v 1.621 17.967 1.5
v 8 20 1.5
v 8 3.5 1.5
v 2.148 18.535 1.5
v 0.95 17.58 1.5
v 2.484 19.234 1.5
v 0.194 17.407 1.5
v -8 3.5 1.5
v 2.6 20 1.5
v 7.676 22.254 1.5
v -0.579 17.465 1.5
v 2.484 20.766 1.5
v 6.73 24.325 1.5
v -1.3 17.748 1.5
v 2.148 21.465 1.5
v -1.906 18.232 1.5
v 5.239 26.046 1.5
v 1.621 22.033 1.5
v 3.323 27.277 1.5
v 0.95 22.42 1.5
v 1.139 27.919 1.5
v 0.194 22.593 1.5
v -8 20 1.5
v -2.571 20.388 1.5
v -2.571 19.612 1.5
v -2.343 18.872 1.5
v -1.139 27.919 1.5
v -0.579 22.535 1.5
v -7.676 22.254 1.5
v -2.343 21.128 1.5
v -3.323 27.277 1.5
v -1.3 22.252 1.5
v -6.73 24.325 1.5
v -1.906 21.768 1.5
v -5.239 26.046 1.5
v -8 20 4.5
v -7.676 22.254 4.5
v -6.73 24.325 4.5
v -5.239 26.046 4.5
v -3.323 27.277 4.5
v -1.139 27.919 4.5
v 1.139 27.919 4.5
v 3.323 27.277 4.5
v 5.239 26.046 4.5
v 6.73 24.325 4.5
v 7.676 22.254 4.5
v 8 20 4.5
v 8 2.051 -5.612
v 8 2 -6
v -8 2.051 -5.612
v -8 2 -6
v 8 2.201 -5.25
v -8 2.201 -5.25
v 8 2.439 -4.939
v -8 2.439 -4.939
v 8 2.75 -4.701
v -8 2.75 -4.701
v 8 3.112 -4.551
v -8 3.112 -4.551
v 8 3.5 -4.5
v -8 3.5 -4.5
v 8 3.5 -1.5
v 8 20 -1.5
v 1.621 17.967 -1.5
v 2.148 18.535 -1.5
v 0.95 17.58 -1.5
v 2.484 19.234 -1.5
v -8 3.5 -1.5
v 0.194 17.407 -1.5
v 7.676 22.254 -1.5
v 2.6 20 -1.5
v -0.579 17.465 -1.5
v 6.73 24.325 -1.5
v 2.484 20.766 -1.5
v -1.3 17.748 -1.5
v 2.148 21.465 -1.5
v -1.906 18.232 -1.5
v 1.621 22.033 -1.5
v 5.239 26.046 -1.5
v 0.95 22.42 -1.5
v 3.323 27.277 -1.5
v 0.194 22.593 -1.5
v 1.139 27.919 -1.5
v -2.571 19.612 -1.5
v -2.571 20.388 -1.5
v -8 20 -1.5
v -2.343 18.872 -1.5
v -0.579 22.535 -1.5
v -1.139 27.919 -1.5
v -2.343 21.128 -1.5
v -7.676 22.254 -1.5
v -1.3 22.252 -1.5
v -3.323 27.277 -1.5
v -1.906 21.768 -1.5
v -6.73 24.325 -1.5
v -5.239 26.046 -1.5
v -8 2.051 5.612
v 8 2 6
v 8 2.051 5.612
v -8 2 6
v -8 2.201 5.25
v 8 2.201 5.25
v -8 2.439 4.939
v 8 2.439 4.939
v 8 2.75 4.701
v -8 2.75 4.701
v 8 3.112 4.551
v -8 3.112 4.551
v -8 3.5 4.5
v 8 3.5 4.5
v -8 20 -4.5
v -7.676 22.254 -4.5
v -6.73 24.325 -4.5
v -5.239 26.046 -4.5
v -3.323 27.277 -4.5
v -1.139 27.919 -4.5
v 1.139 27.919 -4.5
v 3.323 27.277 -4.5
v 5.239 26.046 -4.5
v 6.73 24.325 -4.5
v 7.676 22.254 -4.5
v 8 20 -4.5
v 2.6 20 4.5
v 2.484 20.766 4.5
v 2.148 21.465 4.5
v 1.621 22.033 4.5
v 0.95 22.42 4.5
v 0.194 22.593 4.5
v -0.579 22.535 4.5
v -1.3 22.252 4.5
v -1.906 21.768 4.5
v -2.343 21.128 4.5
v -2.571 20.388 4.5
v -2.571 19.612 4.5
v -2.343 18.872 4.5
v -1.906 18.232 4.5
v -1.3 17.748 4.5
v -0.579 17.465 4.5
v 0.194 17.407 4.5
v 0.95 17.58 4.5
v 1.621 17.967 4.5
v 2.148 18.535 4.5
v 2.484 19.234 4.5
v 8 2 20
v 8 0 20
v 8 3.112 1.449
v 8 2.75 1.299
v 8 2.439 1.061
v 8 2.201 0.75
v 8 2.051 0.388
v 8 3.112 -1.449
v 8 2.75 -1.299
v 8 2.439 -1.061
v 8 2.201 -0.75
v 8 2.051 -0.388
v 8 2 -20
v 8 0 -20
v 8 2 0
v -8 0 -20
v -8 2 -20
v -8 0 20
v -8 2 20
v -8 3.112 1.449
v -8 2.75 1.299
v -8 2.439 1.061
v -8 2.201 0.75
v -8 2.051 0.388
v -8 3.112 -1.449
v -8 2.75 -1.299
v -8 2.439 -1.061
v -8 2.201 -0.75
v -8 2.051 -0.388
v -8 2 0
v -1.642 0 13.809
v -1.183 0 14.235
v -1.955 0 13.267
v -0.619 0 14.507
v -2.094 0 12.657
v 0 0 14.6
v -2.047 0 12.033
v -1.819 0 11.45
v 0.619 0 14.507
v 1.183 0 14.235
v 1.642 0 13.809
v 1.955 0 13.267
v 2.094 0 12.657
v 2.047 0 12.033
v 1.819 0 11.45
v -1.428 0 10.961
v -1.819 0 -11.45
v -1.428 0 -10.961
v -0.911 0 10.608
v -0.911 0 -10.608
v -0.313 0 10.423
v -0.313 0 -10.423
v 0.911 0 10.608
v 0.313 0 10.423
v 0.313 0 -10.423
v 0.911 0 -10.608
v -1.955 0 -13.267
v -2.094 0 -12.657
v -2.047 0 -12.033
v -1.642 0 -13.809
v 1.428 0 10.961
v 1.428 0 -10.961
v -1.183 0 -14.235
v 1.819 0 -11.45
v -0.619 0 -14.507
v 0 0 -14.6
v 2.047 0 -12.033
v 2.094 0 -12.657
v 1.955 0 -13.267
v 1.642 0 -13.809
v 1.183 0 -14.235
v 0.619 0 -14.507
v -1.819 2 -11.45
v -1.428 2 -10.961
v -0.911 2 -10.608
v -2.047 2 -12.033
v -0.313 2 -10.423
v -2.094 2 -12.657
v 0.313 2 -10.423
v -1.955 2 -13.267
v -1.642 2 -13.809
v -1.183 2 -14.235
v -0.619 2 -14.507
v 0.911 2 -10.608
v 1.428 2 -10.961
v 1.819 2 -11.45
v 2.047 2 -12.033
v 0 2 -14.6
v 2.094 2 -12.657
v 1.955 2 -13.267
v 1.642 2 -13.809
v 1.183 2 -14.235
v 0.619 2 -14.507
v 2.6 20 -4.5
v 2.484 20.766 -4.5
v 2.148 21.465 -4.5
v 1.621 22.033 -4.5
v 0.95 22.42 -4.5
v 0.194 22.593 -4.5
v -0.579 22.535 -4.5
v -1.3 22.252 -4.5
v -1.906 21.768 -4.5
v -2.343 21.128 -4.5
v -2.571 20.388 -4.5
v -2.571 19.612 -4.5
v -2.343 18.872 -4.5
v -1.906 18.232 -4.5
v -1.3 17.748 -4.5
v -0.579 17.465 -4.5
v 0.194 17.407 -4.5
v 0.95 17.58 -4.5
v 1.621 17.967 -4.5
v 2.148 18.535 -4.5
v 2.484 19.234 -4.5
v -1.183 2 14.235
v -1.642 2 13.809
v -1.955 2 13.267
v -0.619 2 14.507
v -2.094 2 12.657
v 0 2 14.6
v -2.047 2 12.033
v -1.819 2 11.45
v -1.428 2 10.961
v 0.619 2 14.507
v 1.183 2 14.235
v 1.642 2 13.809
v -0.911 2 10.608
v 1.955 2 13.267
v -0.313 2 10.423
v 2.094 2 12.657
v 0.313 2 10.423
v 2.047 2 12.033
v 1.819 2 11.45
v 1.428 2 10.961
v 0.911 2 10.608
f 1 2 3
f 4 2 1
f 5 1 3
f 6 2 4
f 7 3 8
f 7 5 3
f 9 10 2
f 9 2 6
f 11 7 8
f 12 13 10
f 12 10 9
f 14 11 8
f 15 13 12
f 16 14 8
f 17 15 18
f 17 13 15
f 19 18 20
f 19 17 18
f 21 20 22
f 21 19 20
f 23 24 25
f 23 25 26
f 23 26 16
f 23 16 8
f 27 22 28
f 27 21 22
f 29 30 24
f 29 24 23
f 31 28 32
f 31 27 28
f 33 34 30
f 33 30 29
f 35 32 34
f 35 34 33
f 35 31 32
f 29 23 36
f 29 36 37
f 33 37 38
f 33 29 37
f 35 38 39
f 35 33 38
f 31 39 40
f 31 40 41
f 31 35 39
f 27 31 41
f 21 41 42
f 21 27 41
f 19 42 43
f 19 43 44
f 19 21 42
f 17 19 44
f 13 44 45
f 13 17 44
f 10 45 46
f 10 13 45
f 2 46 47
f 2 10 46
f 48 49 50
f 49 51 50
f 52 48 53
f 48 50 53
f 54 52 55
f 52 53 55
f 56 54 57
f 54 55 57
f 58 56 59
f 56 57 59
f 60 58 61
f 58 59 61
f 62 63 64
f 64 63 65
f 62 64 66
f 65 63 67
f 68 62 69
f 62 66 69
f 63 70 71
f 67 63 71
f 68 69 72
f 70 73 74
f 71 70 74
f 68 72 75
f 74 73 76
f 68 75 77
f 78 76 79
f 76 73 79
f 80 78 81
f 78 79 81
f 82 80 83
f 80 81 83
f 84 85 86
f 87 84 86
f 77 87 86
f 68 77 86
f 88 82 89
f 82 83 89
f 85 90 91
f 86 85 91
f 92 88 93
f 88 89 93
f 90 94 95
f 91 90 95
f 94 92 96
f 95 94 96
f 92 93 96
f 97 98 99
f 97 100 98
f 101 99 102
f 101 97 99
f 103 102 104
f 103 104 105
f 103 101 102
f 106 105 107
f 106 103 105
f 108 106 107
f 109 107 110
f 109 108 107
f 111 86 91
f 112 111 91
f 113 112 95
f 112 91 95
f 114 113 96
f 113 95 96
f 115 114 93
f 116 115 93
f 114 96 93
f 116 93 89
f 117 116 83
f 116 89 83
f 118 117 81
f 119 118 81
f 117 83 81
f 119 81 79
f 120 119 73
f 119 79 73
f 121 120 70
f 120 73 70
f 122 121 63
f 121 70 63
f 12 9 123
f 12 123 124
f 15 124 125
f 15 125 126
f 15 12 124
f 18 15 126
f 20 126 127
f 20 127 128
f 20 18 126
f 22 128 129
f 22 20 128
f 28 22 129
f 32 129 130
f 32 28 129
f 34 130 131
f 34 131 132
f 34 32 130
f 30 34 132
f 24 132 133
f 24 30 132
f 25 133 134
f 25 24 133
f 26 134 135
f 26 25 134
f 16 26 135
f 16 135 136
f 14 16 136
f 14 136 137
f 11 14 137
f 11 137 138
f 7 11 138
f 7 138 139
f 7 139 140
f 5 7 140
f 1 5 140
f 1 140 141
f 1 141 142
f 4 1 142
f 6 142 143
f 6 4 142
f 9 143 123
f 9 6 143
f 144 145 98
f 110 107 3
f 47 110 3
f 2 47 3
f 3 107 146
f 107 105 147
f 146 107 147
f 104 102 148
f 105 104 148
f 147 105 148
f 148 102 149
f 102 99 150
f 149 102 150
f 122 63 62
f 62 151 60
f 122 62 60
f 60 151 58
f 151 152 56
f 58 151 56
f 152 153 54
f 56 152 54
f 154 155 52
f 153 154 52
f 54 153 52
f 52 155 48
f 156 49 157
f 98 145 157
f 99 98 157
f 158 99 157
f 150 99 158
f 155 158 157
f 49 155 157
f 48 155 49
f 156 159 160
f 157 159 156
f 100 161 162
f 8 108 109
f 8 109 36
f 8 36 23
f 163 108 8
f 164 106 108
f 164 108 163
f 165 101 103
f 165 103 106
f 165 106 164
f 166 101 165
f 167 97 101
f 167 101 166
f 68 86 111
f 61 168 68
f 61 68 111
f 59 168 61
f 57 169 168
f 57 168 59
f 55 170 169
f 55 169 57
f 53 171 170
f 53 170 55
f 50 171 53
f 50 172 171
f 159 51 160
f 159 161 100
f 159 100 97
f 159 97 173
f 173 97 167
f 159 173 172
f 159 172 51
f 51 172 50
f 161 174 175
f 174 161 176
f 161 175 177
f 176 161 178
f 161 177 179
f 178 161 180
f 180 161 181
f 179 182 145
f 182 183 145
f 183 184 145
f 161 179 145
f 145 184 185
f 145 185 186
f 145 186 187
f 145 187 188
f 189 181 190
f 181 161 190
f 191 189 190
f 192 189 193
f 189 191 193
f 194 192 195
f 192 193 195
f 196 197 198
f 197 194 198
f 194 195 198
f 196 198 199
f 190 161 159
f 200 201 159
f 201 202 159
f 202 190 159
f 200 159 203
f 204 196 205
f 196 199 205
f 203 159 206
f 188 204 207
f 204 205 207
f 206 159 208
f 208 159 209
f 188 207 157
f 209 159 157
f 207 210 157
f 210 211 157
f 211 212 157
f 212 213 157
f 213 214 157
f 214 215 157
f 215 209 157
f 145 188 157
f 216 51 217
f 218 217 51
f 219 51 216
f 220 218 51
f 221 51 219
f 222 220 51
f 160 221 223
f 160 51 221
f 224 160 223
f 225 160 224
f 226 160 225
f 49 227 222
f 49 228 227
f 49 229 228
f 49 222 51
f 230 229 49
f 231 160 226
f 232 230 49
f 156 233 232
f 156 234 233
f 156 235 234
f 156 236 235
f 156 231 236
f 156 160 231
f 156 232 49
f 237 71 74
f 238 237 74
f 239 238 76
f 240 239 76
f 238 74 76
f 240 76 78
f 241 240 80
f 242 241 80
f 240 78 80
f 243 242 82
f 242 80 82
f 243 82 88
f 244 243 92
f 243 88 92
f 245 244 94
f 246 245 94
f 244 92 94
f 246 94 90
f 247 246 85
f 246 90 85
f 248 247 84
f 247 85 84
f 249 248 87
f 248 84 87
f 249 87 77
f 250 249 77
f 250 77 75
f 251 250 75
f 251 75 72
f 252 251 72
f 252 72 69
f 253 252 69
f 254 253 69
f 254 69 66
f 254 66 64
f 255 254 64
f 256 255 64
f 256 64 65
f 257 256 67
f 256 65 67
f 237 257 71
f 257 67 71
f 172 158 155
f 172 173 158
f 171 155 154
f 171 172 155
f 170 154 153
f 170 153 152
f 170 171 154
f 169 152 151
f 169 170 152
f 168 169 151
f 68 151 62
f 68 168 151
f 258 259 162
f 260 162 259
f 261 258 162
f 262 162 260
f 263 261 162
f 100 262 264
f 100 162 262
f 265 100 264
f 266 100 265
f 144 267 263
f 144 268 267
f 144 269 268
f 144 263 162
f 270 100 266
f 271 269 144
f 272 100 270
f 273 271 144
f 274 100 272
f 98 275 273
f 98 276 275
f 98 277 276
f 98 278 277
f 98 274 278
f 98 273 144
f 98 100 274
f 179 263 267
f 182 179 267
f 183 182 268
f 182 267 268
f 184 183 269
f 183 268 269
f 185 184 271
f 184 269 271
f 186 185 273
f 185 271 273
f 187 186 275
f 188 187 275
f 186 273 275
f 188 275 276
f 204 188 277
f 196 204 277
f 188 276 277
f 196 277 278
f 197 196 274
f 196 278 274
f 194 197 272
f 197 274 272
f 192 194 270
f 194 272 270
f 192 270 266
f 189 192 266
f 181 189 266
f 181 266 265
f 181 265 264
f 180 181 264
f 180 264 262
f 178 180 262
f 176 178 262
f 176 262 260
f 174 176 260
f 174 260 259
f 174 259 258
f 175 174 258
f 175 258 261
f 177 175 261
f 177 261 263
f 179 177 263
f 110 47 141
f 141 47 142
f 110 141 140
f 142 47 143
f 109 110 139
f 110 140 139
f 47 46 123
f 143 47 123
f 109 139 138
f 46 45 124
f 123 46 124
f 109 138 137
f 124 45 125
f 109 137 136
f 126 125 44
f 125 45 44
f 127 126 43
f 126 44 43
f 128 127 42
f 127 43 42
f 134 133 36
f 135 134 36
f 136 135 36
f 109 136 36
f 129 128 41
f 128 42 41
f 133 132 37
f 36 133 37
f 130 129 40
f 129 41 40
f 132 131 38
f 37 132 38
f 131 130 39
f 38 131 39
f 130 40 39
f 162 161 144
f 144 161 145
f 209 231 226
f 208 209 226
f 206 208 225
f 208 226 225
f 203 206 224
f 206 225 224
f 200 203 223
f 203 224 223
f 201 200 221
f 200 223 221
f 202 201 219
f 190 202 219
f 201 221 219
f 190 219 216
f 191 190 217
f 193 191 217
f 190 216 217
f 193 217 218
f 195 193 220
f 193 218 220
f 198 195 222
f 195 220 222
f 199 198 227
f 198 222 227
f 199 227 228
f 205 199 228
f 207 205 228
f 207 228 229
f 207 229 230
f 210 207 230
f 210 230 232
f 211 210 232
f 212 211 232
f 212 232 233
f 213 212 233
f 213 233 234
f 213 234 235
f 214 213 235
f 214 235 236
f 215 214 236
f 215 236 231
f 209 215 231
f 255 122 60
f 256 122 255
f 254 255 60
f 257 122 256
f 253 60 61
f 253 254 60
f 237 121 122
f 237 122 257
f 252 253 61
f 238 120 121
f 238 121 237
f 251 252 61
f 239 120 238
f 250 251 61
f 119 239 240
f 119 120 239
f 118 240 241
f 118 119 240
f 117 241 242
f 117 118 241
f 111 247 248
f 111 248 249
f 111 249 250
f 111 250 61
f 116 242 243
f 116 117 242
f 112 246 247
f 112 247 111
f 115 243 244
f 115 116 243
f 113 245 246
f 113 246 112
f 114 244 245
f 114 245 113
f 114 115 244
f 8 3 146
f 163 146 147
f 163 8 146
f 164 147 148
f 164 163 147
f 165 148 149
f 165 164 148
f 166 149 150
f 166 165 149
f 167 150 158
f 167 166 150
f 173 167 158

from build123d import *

# Parameters (mm, degrees)
SKETCH_2_W          = 16
SKETCH_2_H          = 40
EXTRUDE_1_DEPTH     = 2
EXTRUDE_START       = 1.5
SKETCH_4_R          = 2.6
EXTRUDE_2_DEPTH     = 3
FILLET_2_R          = 1.5
SKETCH_5_R          = 2.1
CUT_EXTRUDE_1_DEPTH = 34.763886032


with BuildPart() as part:
    # 草圖2 → 填料-伸長1 (new body)
    with BuildSketch(Plane(origin=(0, 0, 0), x_dir=(1, 0, 0), z_dir=(0, 1, 0))):
        Rectangle(SKETCH_2_W, SKETCH_2_H)
    extrude(amount=EXTRUDE_1_DEPTH)

    # 草圖4 → 填料-伸長2 (add)
    with BuildSketch(Plane.XY.offset(EXTRUDE_START)):
        with BuildLine():
            Line((8, 20), (8, 2))
            Line((8, 2), (-8, 2))
            Line((-8, 2), (-8, 20))
            ThreePointArc((-8, 20), (0, 28), (8, 20))
        make_face()
        with Locations((0, 20)):
            Circle(SKETCH_4_R, mode=Mode.SUBTRACT)
    extrude_2 = extrude(amount=EXTRUDE_2_DEPTH)

    # 鏡射1: 填料-伸長2 across plane
    add(extrude_2.mirror(Plane.XY))

    # 圓角2
    fillet_2_edges = [part.edges().sort_by_distance(p)[0] for p in [
        (0, 2, 4.5),
        (0, 2, 1.5),
        (0, 2, -4.5),
        (0, 2, -1.5),
    ]]
    fillet(fillet_2_edges, radius=FILLET_2_R - 0.0001)  # a hair under: the kernel refuses the full size

    # 草圖5 → 除料-伸長1 (cut, through all)
    with BuildSketch(Plane(origin=(0, 2, 0), x_dir=(1, 0, 0), z_dir=(0, 1, 0))):
        with Locations(Location((0, -12.5, 0), (0, 0, 270))):
            Circle(SKETCH_5_R)
        with Locations(Location((0, 12.5, 0), (0, 0, 90))):
            Circle(SKETCH_5_R)
    extrude(amount=-CUT_EXTRUDE_1_DEPTH, mode=Mode.SUBTRACT)


solid = part.part
